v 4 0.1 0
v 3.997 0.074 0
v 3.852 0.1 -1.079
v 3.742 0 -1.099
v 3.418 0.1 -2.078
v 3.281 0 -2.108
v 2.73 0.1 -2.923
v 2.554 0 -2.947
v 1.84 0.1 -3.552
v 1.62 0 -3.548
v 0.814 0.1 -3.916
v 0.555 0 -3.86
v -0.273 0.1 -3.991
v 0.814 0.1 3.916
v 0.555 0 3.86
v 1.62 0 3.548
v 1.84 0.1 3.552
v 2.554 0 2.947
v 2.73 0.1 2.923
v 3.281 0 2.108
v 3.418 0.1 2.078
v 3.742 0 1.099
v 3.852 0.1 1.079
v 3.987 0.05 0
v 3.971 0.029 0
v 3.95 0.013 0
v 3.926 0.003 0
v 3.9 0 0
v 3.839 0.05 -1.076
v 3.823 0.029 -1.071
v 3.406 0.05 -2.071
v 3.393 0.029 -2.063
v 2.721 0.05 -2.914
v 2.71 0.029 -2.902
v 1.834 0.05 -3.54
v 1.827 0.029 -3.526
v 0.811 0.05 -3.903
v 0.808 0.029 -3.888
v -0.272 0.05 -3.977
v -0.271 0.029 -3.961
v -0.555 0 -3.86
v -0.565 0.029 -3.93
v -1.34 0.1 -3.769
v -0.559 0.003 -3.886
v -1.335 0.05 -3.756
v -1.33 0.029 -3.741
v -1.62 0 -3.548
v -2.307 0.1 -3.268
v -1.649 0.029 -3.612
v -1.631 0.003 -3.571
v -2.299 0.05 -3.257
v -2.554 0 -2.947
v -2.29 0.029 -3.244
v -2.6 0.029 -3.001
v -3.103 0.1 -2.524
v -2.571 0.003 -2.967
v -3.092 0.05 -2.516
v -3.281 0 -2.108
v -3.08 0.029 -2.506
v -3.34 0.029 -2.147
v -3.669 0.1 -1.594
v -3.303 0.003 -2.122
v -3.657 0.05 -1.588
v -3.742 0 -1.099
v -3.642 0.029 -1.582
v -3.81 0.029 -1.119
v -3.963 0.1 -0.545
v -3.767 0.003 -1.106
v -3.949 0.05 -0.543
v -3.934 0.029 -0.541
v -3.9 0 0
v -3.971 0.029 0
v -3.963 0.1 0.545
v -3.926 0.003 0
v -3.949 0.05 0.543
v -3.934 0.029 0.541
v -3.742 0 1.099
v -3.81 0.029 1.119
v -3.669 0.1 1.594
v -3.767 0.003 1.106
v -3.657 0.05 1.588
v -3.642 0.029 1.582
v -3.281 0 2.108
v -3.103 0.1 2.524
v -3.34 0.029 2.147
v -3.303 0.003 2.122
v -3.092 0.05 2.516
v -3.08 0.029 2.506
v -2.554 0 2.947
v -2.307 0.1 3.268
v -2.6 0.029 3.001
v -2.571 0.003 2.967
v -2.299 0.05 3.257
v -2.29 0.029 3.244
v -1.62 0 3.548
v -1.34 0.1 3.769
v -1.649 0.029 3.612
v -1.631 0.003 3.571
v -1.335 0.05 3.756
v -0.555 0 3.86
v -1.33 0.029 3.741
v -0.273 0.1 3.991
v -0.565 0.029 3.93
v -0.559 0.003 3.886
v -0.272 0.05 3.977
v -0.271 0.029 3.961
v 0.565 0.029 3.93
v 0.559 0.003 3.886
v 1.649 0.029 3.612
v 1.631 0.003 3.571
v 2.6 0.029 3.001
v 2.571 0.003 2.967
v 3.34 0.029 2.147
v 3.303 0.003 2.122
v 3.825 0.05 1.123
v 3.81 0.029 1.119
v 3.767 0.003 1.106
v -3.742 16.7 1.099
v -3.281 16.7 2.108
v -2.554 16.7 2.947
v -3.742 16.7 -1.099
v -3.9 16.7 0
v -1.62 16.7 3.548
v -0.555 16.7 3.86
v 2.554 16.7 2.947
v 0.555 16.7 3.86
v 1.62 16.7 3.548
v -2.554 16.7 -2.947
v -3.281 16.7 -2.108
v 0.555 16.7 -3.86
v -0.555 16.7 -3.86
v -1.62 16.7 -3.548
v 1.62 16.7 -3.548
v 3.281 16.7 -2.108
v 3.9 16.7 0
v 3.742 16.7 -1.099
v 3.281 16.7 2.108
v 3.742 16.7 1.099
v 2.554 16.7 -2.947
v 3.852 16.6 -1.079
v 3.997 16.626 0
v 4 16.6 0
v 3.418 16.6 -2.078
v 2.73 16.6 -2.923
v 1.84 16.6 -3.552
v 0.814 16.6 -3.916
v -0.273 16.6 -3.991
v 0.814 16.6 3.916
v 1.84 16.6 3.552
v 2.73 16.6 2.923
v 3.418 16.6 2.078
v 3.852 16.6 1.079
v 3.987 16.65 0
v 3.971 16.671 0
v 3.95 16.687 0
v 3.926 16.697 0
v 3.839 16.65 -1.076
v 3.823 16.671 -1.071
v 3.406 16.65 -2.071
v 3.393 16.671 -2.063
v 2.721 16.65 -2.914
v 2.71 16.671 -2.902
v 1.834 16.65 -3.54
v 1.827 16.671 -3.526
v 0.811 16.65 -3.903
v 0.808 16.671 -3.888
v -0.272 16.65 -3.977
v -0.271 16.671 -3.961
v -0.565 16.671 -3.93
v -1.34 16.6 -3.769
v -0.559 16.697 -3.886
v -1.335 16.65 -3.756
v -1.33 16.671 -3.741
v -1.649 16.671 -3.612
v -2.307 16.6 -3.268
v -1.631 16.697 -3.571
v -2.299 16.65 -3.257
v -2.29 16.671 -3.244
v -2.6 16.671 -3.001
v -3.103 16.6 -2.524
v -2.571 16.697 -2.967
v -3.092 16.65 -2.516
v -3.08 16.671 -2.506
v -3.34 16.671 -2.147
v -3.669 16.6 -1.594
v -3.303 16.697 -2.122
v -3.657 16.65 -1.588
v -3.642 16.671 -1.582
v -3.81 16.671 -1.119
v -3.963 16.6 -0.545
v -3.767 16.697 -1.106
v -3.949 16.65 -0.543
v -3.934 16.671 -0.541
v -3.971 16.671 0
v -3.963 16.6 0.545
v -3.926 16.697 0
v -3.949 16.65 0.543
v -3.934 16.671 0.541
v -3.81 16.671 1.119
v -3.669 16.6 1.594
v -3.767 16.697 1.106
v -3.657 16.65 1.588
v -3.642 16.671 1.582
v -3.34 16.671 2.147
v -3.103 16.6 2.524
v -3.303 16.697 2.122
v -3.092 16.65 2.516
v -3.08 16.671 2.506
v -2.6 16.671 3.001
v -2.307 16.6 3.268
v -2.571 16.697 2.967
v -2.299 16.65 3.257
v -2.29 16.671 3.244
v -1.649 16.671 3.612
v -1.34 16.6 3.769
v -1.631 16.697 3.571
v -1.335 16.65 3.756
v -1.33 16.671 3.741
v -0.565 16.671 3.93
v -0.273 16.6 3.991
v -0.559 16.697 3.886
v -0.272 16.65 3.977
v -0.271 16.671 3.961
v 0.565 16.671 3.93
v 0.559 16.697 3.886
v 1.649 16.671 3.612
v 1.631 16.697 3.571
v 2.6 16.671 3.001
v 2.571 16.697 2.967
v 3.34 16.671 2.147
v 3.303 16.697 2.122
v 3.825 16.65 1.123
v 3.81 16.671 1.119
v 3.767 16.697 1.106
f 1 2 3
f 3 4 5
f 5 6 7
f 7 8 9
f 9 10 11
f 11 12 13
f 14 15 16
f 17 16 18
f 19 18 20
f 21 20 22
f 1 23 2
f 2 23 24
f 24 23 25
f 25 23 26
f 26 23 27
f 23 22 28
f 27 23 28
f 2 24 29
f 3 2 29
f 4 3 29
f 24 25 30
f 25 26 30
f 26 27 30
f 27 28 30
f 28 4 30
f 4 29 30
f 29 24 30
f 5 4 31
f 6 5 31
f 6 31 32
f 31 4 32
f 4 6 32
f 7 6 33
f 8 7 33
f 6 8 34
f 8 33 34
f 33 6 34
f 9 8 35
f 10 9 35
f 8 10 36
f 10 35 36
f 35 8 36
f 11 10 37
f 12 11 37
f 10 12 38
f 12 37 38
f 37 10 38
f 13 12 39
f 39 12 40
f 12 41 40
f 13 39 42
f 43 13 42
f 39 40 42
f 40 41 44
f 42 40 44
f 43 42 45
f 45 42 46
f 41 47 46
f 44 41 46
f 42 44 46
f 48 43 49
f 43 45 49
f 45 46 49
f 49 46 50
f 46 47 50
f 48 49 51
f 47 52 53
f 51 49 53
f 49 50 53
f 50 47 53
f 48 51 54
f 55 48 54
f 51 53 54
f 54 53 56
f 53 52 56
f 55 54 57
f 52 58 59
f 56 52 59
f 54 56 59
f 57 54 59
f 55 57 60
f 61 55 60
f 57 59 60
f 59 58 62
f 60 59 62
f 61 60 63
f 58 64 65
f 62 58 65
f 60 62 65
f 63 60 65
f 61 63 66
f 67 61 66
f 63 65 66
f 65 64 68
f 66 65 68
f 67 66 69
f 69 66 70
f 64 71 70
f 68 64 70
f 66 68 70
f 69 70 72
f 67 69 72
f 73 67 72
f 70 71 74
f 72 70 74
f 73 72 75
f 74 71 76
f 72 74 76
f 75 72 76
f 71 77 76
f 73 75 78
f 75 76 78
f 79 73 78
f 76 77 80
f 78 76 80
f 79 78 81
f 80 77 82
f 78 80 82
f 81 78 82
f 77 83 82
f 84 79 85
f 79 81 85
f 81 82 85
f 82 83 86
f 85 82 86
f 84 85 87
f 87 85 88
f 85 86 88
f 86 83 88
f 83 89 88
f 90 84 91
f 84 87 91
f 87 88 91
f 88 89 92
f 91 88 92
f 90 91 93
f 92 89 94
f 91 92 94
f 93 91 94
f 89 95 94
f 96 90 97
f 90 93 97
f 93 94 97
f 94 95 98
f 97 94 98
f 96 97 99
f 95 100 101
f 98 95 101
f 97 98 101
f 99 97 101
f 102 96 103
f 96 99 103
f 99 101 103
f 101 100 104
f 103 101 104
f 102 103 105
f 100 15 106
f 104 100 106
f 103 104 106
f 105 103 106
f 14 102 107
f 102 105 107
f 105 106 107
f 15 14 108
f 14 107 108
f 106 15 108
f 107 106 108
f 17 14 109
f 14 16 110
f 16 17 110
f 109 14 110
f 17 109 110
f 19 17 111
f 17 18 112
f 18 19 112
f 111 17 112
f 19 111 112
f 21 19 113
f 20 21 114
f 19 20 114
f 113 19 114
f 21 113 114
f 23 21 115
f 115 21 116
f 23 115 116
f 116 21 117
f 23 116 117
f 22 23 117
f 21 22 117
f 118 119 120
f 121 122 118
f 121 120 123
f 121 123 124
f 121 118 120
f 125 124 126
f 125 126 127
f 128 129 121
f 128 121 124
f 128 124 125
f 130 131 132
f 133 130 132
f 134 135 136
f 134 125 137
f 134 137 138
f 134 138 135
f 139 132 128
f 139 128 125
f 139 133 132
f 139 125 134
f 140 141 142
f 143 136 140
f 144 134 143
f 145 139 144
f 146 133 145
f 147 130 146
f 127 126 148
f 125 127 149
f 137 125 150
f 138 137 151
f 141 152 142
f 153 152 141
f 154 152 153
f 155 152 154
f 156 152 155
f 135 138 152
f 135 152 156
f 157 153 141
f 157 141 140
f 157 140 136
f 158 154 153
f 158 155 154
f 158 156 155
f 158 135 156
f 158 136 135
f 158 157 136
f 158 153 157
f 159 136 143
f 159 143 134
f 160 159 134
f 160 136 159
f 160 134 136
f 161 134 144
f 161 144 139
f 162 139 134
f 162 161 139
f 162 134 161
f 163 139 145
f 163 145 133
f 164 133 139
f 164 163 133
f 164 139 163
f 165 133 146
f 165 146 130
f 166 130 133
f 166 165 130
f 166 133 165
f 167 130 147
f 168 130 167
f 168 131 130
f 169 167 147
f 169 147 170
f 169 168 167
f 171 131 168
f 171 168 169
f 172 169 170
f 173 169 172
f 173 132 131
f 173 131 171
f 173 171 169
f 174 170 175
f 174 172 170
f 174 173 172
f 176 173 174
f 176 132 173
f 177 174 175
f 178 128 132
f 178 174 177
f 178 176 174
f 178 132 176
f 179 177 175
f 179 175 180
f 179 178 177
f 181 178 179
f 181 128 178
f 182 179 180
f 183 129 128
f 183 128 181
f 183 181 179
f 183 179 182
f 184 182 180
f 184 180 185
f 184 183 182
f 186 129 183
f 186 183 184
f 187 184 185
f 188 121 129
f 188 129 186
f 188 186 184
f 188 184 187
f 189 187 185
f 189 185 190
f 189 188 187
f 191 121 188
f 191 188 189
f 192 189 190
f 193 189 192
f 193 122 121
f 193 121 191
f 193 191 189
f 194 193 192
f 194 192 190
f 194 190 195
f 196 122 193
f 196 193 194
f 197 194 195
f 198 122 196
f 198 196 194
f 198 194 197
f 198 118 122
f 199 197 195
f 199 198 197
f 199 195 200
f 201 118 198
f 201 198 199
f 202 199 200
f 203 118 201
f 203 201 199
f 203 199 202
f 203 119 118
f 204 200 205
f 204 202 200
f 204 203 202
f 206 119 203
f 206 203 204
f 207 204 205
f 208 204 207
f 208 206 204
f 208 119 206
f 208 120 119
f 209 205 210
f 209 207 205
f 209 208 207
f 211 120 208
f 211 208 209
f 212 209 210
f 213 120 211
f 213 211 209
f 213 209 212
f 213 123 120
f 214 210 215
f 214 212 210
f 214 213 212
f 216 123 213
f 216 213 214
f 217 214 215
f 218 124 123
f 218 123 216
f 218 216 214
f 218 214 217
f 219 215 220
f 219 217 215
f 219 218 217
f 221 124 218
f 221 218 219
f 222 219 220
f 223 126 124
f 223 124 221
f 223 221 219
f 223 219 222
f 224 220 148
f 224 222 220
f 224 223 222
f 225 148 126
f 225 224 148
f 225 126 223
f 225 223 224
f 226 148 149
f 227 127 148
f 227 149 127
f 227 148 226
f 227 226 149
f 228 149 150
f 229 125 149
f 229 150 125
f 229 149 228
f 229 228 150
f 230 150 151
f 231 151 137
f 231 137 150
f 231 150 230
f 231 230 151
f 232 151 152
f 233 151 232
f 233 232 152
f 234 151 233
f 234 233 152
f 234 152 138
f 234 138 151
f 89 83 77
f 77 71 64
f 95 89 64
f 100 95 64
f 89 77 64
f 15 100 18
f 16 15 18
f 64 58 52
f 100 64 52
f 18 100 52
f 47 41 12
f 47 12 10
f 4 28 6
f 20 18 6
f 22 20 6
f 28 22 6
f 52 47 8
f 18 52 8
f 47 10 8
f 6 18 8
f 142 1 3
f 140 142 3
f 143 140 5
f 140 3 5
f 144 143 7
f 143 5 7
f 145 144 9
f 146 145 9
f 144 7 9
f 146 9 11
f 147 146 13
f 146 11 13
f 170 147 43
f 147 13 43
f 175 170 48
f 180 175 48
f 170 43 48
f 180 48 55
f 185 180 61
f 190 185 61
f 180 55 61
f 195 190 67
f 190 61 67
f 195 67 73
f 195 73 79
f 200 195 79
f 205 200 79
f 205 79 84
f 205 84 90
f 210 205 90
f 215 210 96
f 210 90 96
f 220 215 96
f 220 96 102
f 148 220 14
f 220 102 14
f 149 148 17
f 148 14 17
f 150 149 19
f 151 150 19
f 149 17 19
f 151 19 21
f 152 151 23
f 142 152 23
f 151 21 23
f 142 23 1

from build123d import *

# Parameters (mm, degrees)
SKETCH_1_R      = 4
EXTRUDE_1_DEPTH = 16.7
FILLET_1_R      = 0.1
FILLET_2_R      = 0.1


with BuildPart() as part:
    # Эскиз1 → Бобышка-Вытянуть1 (new body)
    with BuildSketch(Plane(origin=(0, 0, 0), x_dir=(1, 0, 0), z_dir=(0, 1, 0))):
        Circle(SKETCH_1_R)
    extrude(amount=EXTRUDE_1_DEPTH)

    # Скругление1
    fillet_1_edges = [part.edges().sort_by_distance(p)[0] for p in [
        (-4, 16.7, 0),
    ]]
    fillet(fillet_1_edges, radius=FILLET_1_R)

    # Скругление2
    fillet_2_edges = [part.edges().sort_by_distance(p)[0] for p in [
        (-4, 0, 0),
    ]]
    fillet(fillet_2_edges, radius=FILLET_2_R)


solid = part.part
